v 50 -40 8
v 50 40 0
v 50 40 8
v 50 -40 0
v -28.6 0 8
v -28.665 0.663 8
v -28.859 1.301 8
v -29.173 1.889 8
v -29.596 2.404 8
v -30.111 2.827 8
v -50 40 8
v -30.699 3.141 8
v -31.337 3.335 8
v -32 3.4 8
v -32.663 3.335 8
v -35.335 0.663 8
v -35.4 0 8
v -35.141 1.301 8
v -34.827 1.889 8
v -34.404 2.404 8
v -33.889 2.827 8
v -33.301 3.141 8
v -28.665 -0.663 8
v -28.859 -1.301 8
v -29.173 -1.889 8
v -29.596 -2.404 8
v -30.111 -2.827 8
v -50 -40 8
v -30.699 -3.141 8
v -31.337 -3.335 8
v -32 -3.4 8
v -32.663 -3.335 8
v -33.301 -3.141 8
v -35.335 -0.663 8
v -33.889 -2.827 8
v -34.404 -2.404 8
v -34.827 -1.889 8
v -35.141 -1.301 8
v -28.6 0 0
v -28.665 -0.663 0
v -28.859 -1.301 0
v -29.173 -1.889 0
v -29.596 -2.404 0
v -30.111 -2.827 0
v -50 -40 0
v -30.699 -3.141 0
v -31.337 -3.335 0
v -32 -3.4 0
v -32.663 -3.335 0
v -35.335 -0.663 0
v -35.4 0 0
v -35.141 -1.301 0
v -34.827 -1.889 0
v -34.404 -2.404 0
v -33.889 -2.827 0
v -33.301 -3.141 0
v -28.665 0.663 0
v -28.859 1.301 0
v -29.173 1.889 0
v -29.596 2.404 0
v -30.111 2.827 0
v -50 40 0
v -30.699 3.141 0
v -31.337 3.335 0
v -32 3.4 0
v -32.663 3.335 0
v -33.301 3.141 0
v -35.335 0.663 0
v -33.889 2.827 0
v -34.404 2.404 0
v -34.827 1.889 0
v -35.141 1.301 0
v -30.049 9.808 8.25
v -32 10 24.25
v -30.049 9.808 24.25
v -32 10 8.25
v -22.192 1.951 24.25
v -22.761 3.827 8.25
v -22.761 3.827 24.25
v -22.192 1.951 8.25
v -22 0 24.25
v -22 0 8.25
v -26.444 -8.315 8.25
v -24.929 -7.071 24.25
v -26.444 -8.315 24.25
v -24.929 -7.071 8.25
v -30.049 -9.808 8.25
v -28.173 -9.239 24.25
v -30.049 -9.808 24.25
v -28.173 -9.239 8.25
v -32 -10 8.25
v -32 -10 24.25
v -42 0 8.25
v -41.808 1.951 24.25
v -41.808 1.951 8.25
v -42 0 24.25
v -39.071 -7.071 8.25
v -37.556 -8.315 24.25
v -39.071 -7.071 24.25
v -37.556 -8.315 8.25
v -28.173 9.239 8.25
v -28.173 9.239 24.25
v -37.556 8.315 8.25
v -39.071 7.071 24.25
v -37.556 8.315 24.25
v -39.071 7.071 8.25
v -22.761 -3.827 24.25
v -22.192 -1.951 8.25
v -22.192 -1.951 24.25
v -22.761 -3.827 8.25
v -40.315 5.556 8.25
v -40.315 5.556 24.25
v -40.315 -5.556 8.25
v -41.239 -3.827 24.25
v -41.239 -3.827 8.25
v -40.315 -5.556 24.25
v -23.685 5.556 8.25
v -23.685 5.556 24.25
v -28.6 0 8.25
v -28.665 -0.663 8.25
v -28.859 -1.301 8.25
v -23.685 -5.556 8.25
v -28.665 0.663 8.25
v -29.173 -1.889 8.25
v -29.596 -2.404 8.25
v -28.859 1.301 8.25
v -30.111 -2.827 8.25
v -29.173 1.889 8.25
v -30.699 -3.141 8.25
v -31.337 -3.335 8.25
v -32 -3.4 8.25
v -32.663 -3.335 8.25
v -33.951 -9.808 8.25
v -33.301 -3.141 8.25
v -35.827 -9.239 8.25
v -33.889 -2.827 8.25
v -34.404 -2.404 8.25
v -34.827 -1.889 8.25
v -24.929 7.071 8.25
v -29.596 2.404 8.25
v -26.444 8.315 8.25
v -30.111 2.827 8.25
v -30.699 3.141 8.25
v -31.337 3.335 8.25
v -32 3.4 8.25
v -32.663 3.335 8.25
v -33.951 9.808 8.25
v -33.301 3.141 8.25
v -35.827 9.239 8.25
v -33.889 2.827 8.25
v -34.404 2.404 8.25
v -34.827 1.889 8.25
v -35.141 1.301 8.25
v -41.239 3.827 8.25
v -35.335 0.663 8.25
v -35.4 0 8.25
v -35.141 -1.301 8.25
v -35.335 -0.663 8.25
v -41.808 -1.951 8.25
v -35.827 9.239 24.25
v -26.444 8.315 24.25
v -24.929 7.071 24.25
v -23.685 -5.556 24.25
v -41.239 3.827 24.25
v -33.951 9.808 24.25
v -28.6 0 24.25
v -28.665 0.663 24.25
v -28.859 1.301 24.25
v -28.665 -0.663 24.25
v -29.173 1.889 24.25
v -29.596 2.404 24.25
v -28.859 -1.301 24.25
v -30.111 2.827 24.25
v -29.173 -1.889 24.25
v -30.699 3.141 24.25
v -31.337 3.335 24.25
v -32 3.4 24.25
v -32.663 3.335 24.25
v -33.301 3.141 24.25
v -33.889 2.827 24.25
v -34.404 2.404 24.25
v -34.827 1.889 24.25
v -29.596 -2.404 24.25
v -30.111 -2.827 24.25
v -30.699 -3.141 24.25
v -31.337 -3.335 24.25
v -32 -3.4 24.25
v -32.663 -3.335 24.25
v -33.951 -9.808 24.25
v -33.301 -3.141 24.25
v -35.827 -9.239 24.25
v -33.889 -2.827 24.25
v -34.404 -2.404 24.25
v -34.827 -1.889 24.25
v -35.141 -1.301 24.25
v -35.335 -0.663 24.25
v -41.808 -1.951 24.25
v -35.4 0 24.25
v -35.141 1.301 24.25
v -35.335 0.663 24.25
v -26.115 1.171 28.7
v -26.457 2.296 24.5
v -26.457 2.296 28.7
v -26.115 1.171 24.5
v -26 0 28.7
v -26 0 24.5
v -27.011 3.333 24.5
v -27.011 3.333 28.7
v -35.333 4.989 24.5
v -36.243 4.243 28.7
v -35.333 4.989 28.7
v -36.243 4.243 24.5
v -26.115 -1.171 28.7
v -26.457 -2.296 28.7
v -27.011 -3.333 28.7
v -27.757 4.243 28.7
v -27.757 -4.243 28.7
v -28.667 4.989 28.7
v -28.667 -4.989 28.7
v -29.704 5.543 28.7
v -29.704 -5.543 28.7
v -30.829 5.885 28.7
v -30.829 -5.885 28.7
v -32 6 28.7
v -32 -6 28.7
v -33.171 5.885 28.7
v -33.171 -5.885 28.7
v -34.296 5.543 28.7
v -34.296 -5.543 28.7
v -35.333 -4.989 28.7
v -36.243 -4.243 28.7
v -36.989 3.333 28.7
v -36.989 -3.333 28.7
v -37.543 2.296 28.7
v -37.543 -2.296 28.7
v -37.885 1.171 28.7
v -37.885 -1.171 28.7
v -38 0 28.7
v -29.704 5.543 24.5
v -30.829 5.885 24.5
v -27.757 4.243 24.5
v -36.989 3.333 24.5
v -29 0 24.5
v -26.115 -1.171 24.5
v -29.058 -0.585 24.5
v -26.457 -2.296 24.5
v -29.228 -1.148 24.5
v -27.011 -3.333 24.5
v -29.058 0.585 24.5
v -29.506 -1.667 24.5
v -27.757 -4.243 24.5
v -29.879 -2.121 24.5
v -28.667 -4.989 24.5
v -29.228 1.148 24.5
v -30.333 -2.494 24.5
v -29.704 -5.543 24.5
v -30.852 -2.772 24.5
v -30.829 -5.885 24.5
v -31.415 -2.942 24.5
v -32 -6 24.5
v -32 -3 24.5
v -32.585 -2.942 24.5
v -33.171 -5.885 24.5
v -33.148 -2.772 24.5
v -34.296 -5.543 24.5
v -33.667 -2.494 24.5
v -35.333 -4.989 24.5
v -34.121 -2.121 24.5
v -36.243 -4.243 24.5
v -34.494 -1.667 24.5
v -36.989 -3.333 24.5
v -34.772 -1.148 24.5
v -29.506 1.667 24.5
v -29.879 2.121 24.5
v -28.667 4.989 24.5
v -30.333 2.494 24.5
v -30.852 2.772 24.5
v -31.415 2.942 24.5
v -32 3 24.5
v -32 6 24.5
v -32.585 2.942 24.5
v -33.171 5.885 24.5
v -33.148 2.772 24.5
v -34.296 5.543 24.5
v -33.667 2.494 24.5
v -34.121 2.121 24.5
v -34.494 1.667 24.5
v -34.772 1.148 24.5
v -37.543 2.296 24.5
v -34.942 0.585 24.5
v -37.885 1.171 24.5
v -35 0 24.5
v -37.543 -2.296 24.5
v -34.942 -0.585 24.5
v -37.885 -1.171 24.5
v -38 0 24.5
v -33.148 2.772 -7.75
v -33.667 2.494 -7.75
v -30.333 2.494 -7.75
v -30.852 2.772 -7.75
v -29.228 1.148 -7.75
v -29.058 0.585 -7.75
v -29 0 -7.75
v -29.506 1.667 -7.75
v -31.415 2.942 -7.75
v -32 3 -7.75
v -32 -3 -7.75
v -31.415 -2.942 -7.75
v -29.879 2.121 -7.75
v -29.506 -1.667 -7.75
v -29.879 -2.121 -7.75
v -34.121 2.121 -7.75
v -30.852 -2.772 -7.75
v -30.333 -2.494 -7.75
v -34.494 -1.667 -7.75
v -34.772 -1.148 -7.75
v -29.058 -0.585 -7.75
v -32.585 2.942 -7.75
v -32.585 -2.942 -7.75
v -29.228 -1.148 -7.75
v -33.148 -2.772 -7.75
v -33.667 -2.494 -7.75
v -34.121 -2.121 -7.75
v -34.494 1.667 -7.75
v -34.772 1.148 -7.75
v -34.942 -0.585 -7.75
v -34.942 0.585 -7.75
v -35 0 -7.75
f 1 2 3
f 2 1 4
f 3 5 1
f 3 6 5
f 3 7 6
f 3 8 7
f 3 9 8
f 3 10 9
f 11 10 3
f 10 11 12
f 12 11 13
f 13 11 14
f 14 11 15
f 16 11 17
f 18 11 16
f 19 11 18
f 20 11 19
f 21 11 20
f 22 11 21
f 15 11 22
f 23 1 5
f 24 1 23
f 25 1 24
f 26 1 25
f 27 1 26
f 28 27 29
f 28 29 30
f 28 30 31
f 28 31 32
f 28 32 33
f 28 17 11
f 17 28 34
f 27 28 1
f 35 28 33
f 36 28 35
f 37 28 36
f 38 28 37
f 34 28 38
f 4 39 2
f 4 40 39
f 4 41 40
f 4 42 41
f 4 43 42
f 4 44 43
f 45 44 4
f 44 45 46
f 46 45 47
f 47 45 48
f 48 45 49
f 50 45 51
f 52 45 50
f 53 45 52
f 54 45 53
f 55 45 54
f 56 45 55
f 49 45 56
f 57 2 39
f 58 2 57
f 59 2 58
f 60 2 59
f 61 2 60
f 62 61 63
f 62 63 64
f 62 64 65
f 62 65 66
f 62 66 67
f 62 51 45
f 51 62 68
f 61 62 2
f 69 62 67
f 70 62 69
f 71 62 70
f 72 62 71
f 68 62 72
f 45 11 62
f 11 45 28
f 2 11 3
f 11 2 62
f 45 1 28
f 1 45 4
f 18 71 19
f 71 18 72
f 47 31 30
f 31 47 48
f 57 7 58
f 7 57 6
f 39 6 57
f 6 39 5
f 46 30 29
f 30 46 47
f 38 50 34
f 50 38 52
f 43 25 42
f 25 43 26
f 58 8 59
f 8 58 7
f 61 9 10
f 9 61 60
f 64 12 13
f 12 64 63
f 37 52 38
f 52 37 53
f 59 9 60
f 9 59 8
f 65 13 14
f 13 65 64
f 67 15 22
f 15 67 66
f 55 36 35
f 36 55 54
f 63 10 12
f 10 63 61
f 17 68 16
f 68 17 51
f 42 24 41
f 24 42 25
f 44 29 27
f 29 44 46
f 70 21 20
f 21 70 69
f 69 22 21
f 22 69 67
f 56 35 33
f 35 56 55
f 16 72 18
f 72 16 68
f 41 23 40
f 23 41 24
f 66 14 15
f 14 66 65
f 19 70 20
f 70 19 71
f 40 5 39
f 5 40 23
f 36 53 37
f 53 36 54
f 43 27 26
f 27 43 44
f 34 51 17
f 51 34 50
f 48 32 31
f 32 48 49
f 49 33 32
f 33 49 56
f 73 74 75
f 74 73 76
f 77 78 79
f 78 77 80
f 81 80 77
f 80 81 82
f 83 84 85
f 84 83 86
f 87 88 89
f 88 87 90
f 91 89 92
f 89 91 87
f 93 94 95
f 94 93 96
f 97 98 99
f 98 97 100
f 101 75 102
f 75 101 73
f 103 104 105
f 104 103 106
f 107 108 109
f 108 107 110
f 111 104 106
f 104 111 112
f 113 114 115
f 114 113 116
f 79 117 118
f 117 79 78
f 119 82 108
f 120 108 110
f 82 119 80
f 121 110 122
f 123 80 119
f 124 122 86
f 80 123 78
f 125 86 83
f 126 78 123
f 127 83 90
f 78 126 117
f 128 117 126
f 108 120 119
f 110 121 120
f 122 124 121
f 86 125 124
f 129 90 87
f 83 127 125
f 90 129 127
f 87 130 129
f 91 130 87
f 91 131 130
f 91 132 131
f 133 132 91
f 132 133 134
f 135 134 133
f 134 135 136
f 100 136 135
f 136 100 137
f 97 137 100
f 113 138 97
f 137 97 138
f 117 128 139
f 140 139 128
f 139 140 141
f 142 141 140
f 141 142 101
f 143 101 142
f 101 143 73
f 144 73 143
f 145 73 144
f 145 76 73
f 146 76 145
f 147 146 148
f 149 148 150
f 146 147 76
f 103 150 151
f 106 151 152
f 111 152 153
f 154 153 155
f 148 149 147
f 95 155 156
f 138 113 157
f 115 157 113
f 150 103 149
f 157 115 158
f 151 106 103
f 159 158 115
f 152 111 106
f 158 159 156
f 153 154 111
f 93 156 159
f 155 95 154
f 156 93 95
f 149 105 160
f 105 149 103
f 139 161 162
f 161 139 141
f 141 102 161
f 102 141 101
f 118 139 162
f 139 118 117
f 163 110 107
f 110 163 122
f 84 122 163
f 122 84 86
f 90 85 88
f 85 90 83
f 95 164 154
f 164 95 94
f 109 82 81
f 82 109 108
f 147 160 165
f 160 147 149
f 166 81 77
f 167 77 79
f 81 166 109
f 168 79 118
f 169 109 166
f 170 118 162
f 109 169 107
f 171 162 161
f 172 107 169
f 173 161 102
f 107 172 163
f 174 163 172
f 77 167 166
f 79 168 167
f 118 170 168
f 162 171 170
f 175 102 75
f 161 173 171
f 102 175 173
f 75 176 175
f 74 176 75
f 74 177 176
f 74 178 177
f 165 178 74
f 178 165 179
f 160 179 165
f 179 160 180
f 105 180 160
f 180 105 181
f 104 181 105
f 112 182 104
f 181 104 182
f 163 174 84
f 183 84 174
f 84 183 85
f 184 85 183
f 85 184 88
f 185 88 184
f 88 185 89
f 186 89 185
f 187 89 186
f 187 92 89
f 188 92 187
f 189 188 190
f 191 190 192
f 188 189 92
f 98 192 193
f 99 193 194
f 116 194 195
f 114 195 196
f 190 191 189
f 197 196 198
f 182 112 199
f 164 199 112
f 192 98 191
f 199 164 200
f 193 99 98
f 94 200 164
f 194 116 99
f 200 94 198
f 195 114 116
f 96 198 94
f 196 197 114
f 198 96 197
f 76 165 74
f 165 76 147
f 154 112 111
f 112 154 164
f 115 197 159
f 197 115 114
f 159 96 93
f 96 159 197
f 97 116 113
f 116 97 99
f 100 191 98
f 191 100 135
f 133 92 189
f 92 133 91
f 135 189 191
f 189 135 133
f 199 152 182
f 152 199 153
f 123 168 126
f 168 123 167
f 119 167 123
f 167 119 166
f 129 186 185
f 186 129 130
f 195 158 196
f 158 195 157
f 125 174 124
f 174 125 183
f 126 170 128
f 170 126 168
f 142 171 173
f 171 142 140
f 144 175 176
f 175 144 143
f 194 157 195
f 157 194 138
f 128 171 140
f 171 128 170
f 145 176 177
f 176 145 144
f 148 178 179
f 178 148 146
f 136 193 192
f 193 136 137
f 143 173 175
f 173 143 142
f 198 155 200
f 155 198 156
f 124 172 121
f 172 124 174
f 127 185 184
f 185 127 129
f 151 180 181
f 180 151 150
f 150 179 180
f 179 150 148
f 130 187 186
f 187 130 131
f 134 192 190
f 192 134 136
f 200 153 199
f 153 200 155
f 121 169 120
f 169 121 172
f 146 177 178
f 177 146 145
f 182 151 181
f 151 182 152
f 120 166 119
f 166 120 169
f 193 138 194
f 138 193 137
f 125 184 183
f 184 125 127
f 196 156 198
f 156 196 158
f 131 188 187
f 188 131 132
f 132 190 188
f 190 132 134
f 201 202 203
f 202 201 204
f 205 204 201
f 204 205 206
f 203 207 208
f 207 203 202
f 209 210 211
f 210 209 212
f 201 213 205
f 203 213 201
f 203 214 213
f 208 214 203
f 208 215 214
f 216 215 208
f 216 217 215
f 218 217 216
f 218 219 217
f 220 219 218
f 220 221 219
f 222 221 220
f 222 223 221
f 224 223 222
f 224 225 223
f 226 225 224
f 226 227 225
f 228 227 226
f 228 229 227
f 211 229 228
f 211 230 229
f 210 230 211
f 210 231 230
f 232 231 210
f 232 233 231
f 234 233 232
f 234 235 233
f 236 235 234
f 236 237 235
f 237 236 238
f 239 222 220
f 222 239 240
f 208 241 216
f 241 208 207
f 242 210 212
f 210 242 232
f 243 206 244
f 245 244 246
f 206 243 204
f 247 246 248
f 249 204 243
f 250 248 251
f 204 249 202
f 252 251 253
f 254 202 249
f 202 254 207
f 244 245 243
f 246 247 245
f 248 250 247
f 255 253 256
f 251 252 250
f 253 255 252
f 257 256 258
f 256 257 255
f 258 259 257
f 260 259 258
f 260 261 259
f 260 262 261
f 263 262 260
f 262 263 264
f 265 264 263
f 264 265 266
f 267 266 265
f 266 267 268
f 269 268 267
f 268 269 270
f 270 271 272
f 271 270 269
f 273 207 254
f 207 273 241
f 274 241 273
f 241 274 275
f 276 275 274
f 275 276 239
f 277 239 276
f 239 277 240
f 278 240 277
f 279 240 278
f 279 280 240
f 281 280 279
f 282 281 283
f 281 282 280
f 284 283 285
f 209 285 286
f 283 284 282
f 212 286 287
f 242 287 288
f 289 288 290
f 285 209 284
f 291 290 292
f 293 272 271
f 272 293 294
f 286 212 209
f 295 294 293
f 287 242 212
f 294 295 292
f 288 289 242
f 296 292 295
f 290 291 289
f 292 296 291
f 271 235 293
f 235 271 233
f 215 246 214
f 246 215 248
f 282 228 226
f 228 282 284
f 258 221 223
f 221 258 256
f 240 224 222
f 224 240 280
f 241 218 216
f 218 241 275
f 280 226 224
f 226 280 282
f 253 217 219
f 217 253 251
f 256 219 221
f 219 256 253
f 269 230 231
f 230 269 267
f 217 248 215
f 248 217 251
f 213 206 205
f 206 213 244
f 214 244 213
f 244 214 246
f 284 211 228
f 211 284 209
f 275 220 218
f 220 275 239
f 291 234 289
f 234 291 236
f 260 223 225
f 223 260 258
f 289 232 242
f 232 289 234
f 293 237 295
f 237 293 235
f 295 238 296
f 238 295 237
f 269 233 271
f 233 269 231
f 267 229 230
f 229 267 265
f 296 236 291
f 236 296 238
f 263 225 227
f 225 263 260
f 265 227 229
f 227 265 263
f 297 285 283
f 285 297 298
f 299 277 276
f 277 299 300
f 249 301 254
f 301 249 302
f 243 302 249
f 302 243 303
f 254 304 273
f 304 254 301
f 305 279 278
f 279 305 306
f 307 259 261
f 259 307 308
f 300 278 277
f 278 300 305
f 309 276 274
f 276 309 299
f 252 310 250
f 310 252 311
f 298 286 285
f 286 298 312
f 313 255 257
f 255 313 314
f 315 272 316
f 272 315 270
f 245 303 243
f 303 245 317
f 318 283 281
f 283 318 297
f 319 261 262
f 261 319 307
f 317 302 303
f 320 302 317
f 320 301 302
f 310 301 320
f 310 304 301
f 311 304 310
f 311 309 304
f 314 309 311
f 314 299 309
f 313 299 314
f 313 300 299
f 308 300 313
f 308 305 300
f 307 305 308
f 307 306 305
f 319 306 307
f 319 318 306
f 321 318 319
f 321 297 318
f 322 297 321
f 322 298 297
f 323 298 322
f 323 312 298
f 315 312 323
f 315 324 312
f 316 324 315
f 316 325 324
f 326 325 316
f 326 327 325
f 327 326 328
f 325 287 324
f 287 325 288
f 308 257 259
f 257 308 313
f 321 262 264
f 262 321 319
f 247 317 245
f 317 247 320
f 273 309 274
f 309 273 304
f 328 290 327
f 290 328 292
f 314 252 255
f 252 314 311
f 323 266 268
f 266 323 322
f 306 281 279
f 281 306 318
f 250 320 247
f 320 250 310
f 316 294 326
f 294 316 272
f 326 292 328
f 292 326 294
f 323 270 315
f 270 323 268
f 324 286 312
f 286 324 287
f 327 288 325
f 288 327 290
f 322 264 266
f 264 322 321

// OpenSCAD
$fn = 32;

// ------------------------------------------------------------------------
// Standoff columns: 1 d20 standoffs, bolts d6
// Every part is its own module, assembly() places them once.
// ------------------------------------------------------------------------

// --- part 1 ---
module base_plate() {
  difference() {
    translate([-50, -40, 0]) cube([100, 80, 8]);
    translate([-32, 0, -1]) cylinder(h = 10, d = 6.8);
  }
}

// --- part 2 ---
module spacer() {
  difference() {
      translate([0, 0, 0]) cylinder(h = 16, d = 20);
      translate([0, 0, -1]) cylinder(h = 18, d = 6.8);
    }
}

// --- part 3 ---
module bolt() {
  cylinder(h = 4.2, d = 12);
  translate([0, 0, -32.25]) cylinder(h = 32.25, d = 6);
}

// --- assembly ---
module assembly() {
  translate([0, 0, 0]) rotate([0, 0, 0]) base_plate();
  translate([-32, 0, 8.25]) rotate([0, 0, 0]) spacer();
  translate([-32, 0, 24.5]) rotate([0, 0, 0]) bolt();
}

assembly();
